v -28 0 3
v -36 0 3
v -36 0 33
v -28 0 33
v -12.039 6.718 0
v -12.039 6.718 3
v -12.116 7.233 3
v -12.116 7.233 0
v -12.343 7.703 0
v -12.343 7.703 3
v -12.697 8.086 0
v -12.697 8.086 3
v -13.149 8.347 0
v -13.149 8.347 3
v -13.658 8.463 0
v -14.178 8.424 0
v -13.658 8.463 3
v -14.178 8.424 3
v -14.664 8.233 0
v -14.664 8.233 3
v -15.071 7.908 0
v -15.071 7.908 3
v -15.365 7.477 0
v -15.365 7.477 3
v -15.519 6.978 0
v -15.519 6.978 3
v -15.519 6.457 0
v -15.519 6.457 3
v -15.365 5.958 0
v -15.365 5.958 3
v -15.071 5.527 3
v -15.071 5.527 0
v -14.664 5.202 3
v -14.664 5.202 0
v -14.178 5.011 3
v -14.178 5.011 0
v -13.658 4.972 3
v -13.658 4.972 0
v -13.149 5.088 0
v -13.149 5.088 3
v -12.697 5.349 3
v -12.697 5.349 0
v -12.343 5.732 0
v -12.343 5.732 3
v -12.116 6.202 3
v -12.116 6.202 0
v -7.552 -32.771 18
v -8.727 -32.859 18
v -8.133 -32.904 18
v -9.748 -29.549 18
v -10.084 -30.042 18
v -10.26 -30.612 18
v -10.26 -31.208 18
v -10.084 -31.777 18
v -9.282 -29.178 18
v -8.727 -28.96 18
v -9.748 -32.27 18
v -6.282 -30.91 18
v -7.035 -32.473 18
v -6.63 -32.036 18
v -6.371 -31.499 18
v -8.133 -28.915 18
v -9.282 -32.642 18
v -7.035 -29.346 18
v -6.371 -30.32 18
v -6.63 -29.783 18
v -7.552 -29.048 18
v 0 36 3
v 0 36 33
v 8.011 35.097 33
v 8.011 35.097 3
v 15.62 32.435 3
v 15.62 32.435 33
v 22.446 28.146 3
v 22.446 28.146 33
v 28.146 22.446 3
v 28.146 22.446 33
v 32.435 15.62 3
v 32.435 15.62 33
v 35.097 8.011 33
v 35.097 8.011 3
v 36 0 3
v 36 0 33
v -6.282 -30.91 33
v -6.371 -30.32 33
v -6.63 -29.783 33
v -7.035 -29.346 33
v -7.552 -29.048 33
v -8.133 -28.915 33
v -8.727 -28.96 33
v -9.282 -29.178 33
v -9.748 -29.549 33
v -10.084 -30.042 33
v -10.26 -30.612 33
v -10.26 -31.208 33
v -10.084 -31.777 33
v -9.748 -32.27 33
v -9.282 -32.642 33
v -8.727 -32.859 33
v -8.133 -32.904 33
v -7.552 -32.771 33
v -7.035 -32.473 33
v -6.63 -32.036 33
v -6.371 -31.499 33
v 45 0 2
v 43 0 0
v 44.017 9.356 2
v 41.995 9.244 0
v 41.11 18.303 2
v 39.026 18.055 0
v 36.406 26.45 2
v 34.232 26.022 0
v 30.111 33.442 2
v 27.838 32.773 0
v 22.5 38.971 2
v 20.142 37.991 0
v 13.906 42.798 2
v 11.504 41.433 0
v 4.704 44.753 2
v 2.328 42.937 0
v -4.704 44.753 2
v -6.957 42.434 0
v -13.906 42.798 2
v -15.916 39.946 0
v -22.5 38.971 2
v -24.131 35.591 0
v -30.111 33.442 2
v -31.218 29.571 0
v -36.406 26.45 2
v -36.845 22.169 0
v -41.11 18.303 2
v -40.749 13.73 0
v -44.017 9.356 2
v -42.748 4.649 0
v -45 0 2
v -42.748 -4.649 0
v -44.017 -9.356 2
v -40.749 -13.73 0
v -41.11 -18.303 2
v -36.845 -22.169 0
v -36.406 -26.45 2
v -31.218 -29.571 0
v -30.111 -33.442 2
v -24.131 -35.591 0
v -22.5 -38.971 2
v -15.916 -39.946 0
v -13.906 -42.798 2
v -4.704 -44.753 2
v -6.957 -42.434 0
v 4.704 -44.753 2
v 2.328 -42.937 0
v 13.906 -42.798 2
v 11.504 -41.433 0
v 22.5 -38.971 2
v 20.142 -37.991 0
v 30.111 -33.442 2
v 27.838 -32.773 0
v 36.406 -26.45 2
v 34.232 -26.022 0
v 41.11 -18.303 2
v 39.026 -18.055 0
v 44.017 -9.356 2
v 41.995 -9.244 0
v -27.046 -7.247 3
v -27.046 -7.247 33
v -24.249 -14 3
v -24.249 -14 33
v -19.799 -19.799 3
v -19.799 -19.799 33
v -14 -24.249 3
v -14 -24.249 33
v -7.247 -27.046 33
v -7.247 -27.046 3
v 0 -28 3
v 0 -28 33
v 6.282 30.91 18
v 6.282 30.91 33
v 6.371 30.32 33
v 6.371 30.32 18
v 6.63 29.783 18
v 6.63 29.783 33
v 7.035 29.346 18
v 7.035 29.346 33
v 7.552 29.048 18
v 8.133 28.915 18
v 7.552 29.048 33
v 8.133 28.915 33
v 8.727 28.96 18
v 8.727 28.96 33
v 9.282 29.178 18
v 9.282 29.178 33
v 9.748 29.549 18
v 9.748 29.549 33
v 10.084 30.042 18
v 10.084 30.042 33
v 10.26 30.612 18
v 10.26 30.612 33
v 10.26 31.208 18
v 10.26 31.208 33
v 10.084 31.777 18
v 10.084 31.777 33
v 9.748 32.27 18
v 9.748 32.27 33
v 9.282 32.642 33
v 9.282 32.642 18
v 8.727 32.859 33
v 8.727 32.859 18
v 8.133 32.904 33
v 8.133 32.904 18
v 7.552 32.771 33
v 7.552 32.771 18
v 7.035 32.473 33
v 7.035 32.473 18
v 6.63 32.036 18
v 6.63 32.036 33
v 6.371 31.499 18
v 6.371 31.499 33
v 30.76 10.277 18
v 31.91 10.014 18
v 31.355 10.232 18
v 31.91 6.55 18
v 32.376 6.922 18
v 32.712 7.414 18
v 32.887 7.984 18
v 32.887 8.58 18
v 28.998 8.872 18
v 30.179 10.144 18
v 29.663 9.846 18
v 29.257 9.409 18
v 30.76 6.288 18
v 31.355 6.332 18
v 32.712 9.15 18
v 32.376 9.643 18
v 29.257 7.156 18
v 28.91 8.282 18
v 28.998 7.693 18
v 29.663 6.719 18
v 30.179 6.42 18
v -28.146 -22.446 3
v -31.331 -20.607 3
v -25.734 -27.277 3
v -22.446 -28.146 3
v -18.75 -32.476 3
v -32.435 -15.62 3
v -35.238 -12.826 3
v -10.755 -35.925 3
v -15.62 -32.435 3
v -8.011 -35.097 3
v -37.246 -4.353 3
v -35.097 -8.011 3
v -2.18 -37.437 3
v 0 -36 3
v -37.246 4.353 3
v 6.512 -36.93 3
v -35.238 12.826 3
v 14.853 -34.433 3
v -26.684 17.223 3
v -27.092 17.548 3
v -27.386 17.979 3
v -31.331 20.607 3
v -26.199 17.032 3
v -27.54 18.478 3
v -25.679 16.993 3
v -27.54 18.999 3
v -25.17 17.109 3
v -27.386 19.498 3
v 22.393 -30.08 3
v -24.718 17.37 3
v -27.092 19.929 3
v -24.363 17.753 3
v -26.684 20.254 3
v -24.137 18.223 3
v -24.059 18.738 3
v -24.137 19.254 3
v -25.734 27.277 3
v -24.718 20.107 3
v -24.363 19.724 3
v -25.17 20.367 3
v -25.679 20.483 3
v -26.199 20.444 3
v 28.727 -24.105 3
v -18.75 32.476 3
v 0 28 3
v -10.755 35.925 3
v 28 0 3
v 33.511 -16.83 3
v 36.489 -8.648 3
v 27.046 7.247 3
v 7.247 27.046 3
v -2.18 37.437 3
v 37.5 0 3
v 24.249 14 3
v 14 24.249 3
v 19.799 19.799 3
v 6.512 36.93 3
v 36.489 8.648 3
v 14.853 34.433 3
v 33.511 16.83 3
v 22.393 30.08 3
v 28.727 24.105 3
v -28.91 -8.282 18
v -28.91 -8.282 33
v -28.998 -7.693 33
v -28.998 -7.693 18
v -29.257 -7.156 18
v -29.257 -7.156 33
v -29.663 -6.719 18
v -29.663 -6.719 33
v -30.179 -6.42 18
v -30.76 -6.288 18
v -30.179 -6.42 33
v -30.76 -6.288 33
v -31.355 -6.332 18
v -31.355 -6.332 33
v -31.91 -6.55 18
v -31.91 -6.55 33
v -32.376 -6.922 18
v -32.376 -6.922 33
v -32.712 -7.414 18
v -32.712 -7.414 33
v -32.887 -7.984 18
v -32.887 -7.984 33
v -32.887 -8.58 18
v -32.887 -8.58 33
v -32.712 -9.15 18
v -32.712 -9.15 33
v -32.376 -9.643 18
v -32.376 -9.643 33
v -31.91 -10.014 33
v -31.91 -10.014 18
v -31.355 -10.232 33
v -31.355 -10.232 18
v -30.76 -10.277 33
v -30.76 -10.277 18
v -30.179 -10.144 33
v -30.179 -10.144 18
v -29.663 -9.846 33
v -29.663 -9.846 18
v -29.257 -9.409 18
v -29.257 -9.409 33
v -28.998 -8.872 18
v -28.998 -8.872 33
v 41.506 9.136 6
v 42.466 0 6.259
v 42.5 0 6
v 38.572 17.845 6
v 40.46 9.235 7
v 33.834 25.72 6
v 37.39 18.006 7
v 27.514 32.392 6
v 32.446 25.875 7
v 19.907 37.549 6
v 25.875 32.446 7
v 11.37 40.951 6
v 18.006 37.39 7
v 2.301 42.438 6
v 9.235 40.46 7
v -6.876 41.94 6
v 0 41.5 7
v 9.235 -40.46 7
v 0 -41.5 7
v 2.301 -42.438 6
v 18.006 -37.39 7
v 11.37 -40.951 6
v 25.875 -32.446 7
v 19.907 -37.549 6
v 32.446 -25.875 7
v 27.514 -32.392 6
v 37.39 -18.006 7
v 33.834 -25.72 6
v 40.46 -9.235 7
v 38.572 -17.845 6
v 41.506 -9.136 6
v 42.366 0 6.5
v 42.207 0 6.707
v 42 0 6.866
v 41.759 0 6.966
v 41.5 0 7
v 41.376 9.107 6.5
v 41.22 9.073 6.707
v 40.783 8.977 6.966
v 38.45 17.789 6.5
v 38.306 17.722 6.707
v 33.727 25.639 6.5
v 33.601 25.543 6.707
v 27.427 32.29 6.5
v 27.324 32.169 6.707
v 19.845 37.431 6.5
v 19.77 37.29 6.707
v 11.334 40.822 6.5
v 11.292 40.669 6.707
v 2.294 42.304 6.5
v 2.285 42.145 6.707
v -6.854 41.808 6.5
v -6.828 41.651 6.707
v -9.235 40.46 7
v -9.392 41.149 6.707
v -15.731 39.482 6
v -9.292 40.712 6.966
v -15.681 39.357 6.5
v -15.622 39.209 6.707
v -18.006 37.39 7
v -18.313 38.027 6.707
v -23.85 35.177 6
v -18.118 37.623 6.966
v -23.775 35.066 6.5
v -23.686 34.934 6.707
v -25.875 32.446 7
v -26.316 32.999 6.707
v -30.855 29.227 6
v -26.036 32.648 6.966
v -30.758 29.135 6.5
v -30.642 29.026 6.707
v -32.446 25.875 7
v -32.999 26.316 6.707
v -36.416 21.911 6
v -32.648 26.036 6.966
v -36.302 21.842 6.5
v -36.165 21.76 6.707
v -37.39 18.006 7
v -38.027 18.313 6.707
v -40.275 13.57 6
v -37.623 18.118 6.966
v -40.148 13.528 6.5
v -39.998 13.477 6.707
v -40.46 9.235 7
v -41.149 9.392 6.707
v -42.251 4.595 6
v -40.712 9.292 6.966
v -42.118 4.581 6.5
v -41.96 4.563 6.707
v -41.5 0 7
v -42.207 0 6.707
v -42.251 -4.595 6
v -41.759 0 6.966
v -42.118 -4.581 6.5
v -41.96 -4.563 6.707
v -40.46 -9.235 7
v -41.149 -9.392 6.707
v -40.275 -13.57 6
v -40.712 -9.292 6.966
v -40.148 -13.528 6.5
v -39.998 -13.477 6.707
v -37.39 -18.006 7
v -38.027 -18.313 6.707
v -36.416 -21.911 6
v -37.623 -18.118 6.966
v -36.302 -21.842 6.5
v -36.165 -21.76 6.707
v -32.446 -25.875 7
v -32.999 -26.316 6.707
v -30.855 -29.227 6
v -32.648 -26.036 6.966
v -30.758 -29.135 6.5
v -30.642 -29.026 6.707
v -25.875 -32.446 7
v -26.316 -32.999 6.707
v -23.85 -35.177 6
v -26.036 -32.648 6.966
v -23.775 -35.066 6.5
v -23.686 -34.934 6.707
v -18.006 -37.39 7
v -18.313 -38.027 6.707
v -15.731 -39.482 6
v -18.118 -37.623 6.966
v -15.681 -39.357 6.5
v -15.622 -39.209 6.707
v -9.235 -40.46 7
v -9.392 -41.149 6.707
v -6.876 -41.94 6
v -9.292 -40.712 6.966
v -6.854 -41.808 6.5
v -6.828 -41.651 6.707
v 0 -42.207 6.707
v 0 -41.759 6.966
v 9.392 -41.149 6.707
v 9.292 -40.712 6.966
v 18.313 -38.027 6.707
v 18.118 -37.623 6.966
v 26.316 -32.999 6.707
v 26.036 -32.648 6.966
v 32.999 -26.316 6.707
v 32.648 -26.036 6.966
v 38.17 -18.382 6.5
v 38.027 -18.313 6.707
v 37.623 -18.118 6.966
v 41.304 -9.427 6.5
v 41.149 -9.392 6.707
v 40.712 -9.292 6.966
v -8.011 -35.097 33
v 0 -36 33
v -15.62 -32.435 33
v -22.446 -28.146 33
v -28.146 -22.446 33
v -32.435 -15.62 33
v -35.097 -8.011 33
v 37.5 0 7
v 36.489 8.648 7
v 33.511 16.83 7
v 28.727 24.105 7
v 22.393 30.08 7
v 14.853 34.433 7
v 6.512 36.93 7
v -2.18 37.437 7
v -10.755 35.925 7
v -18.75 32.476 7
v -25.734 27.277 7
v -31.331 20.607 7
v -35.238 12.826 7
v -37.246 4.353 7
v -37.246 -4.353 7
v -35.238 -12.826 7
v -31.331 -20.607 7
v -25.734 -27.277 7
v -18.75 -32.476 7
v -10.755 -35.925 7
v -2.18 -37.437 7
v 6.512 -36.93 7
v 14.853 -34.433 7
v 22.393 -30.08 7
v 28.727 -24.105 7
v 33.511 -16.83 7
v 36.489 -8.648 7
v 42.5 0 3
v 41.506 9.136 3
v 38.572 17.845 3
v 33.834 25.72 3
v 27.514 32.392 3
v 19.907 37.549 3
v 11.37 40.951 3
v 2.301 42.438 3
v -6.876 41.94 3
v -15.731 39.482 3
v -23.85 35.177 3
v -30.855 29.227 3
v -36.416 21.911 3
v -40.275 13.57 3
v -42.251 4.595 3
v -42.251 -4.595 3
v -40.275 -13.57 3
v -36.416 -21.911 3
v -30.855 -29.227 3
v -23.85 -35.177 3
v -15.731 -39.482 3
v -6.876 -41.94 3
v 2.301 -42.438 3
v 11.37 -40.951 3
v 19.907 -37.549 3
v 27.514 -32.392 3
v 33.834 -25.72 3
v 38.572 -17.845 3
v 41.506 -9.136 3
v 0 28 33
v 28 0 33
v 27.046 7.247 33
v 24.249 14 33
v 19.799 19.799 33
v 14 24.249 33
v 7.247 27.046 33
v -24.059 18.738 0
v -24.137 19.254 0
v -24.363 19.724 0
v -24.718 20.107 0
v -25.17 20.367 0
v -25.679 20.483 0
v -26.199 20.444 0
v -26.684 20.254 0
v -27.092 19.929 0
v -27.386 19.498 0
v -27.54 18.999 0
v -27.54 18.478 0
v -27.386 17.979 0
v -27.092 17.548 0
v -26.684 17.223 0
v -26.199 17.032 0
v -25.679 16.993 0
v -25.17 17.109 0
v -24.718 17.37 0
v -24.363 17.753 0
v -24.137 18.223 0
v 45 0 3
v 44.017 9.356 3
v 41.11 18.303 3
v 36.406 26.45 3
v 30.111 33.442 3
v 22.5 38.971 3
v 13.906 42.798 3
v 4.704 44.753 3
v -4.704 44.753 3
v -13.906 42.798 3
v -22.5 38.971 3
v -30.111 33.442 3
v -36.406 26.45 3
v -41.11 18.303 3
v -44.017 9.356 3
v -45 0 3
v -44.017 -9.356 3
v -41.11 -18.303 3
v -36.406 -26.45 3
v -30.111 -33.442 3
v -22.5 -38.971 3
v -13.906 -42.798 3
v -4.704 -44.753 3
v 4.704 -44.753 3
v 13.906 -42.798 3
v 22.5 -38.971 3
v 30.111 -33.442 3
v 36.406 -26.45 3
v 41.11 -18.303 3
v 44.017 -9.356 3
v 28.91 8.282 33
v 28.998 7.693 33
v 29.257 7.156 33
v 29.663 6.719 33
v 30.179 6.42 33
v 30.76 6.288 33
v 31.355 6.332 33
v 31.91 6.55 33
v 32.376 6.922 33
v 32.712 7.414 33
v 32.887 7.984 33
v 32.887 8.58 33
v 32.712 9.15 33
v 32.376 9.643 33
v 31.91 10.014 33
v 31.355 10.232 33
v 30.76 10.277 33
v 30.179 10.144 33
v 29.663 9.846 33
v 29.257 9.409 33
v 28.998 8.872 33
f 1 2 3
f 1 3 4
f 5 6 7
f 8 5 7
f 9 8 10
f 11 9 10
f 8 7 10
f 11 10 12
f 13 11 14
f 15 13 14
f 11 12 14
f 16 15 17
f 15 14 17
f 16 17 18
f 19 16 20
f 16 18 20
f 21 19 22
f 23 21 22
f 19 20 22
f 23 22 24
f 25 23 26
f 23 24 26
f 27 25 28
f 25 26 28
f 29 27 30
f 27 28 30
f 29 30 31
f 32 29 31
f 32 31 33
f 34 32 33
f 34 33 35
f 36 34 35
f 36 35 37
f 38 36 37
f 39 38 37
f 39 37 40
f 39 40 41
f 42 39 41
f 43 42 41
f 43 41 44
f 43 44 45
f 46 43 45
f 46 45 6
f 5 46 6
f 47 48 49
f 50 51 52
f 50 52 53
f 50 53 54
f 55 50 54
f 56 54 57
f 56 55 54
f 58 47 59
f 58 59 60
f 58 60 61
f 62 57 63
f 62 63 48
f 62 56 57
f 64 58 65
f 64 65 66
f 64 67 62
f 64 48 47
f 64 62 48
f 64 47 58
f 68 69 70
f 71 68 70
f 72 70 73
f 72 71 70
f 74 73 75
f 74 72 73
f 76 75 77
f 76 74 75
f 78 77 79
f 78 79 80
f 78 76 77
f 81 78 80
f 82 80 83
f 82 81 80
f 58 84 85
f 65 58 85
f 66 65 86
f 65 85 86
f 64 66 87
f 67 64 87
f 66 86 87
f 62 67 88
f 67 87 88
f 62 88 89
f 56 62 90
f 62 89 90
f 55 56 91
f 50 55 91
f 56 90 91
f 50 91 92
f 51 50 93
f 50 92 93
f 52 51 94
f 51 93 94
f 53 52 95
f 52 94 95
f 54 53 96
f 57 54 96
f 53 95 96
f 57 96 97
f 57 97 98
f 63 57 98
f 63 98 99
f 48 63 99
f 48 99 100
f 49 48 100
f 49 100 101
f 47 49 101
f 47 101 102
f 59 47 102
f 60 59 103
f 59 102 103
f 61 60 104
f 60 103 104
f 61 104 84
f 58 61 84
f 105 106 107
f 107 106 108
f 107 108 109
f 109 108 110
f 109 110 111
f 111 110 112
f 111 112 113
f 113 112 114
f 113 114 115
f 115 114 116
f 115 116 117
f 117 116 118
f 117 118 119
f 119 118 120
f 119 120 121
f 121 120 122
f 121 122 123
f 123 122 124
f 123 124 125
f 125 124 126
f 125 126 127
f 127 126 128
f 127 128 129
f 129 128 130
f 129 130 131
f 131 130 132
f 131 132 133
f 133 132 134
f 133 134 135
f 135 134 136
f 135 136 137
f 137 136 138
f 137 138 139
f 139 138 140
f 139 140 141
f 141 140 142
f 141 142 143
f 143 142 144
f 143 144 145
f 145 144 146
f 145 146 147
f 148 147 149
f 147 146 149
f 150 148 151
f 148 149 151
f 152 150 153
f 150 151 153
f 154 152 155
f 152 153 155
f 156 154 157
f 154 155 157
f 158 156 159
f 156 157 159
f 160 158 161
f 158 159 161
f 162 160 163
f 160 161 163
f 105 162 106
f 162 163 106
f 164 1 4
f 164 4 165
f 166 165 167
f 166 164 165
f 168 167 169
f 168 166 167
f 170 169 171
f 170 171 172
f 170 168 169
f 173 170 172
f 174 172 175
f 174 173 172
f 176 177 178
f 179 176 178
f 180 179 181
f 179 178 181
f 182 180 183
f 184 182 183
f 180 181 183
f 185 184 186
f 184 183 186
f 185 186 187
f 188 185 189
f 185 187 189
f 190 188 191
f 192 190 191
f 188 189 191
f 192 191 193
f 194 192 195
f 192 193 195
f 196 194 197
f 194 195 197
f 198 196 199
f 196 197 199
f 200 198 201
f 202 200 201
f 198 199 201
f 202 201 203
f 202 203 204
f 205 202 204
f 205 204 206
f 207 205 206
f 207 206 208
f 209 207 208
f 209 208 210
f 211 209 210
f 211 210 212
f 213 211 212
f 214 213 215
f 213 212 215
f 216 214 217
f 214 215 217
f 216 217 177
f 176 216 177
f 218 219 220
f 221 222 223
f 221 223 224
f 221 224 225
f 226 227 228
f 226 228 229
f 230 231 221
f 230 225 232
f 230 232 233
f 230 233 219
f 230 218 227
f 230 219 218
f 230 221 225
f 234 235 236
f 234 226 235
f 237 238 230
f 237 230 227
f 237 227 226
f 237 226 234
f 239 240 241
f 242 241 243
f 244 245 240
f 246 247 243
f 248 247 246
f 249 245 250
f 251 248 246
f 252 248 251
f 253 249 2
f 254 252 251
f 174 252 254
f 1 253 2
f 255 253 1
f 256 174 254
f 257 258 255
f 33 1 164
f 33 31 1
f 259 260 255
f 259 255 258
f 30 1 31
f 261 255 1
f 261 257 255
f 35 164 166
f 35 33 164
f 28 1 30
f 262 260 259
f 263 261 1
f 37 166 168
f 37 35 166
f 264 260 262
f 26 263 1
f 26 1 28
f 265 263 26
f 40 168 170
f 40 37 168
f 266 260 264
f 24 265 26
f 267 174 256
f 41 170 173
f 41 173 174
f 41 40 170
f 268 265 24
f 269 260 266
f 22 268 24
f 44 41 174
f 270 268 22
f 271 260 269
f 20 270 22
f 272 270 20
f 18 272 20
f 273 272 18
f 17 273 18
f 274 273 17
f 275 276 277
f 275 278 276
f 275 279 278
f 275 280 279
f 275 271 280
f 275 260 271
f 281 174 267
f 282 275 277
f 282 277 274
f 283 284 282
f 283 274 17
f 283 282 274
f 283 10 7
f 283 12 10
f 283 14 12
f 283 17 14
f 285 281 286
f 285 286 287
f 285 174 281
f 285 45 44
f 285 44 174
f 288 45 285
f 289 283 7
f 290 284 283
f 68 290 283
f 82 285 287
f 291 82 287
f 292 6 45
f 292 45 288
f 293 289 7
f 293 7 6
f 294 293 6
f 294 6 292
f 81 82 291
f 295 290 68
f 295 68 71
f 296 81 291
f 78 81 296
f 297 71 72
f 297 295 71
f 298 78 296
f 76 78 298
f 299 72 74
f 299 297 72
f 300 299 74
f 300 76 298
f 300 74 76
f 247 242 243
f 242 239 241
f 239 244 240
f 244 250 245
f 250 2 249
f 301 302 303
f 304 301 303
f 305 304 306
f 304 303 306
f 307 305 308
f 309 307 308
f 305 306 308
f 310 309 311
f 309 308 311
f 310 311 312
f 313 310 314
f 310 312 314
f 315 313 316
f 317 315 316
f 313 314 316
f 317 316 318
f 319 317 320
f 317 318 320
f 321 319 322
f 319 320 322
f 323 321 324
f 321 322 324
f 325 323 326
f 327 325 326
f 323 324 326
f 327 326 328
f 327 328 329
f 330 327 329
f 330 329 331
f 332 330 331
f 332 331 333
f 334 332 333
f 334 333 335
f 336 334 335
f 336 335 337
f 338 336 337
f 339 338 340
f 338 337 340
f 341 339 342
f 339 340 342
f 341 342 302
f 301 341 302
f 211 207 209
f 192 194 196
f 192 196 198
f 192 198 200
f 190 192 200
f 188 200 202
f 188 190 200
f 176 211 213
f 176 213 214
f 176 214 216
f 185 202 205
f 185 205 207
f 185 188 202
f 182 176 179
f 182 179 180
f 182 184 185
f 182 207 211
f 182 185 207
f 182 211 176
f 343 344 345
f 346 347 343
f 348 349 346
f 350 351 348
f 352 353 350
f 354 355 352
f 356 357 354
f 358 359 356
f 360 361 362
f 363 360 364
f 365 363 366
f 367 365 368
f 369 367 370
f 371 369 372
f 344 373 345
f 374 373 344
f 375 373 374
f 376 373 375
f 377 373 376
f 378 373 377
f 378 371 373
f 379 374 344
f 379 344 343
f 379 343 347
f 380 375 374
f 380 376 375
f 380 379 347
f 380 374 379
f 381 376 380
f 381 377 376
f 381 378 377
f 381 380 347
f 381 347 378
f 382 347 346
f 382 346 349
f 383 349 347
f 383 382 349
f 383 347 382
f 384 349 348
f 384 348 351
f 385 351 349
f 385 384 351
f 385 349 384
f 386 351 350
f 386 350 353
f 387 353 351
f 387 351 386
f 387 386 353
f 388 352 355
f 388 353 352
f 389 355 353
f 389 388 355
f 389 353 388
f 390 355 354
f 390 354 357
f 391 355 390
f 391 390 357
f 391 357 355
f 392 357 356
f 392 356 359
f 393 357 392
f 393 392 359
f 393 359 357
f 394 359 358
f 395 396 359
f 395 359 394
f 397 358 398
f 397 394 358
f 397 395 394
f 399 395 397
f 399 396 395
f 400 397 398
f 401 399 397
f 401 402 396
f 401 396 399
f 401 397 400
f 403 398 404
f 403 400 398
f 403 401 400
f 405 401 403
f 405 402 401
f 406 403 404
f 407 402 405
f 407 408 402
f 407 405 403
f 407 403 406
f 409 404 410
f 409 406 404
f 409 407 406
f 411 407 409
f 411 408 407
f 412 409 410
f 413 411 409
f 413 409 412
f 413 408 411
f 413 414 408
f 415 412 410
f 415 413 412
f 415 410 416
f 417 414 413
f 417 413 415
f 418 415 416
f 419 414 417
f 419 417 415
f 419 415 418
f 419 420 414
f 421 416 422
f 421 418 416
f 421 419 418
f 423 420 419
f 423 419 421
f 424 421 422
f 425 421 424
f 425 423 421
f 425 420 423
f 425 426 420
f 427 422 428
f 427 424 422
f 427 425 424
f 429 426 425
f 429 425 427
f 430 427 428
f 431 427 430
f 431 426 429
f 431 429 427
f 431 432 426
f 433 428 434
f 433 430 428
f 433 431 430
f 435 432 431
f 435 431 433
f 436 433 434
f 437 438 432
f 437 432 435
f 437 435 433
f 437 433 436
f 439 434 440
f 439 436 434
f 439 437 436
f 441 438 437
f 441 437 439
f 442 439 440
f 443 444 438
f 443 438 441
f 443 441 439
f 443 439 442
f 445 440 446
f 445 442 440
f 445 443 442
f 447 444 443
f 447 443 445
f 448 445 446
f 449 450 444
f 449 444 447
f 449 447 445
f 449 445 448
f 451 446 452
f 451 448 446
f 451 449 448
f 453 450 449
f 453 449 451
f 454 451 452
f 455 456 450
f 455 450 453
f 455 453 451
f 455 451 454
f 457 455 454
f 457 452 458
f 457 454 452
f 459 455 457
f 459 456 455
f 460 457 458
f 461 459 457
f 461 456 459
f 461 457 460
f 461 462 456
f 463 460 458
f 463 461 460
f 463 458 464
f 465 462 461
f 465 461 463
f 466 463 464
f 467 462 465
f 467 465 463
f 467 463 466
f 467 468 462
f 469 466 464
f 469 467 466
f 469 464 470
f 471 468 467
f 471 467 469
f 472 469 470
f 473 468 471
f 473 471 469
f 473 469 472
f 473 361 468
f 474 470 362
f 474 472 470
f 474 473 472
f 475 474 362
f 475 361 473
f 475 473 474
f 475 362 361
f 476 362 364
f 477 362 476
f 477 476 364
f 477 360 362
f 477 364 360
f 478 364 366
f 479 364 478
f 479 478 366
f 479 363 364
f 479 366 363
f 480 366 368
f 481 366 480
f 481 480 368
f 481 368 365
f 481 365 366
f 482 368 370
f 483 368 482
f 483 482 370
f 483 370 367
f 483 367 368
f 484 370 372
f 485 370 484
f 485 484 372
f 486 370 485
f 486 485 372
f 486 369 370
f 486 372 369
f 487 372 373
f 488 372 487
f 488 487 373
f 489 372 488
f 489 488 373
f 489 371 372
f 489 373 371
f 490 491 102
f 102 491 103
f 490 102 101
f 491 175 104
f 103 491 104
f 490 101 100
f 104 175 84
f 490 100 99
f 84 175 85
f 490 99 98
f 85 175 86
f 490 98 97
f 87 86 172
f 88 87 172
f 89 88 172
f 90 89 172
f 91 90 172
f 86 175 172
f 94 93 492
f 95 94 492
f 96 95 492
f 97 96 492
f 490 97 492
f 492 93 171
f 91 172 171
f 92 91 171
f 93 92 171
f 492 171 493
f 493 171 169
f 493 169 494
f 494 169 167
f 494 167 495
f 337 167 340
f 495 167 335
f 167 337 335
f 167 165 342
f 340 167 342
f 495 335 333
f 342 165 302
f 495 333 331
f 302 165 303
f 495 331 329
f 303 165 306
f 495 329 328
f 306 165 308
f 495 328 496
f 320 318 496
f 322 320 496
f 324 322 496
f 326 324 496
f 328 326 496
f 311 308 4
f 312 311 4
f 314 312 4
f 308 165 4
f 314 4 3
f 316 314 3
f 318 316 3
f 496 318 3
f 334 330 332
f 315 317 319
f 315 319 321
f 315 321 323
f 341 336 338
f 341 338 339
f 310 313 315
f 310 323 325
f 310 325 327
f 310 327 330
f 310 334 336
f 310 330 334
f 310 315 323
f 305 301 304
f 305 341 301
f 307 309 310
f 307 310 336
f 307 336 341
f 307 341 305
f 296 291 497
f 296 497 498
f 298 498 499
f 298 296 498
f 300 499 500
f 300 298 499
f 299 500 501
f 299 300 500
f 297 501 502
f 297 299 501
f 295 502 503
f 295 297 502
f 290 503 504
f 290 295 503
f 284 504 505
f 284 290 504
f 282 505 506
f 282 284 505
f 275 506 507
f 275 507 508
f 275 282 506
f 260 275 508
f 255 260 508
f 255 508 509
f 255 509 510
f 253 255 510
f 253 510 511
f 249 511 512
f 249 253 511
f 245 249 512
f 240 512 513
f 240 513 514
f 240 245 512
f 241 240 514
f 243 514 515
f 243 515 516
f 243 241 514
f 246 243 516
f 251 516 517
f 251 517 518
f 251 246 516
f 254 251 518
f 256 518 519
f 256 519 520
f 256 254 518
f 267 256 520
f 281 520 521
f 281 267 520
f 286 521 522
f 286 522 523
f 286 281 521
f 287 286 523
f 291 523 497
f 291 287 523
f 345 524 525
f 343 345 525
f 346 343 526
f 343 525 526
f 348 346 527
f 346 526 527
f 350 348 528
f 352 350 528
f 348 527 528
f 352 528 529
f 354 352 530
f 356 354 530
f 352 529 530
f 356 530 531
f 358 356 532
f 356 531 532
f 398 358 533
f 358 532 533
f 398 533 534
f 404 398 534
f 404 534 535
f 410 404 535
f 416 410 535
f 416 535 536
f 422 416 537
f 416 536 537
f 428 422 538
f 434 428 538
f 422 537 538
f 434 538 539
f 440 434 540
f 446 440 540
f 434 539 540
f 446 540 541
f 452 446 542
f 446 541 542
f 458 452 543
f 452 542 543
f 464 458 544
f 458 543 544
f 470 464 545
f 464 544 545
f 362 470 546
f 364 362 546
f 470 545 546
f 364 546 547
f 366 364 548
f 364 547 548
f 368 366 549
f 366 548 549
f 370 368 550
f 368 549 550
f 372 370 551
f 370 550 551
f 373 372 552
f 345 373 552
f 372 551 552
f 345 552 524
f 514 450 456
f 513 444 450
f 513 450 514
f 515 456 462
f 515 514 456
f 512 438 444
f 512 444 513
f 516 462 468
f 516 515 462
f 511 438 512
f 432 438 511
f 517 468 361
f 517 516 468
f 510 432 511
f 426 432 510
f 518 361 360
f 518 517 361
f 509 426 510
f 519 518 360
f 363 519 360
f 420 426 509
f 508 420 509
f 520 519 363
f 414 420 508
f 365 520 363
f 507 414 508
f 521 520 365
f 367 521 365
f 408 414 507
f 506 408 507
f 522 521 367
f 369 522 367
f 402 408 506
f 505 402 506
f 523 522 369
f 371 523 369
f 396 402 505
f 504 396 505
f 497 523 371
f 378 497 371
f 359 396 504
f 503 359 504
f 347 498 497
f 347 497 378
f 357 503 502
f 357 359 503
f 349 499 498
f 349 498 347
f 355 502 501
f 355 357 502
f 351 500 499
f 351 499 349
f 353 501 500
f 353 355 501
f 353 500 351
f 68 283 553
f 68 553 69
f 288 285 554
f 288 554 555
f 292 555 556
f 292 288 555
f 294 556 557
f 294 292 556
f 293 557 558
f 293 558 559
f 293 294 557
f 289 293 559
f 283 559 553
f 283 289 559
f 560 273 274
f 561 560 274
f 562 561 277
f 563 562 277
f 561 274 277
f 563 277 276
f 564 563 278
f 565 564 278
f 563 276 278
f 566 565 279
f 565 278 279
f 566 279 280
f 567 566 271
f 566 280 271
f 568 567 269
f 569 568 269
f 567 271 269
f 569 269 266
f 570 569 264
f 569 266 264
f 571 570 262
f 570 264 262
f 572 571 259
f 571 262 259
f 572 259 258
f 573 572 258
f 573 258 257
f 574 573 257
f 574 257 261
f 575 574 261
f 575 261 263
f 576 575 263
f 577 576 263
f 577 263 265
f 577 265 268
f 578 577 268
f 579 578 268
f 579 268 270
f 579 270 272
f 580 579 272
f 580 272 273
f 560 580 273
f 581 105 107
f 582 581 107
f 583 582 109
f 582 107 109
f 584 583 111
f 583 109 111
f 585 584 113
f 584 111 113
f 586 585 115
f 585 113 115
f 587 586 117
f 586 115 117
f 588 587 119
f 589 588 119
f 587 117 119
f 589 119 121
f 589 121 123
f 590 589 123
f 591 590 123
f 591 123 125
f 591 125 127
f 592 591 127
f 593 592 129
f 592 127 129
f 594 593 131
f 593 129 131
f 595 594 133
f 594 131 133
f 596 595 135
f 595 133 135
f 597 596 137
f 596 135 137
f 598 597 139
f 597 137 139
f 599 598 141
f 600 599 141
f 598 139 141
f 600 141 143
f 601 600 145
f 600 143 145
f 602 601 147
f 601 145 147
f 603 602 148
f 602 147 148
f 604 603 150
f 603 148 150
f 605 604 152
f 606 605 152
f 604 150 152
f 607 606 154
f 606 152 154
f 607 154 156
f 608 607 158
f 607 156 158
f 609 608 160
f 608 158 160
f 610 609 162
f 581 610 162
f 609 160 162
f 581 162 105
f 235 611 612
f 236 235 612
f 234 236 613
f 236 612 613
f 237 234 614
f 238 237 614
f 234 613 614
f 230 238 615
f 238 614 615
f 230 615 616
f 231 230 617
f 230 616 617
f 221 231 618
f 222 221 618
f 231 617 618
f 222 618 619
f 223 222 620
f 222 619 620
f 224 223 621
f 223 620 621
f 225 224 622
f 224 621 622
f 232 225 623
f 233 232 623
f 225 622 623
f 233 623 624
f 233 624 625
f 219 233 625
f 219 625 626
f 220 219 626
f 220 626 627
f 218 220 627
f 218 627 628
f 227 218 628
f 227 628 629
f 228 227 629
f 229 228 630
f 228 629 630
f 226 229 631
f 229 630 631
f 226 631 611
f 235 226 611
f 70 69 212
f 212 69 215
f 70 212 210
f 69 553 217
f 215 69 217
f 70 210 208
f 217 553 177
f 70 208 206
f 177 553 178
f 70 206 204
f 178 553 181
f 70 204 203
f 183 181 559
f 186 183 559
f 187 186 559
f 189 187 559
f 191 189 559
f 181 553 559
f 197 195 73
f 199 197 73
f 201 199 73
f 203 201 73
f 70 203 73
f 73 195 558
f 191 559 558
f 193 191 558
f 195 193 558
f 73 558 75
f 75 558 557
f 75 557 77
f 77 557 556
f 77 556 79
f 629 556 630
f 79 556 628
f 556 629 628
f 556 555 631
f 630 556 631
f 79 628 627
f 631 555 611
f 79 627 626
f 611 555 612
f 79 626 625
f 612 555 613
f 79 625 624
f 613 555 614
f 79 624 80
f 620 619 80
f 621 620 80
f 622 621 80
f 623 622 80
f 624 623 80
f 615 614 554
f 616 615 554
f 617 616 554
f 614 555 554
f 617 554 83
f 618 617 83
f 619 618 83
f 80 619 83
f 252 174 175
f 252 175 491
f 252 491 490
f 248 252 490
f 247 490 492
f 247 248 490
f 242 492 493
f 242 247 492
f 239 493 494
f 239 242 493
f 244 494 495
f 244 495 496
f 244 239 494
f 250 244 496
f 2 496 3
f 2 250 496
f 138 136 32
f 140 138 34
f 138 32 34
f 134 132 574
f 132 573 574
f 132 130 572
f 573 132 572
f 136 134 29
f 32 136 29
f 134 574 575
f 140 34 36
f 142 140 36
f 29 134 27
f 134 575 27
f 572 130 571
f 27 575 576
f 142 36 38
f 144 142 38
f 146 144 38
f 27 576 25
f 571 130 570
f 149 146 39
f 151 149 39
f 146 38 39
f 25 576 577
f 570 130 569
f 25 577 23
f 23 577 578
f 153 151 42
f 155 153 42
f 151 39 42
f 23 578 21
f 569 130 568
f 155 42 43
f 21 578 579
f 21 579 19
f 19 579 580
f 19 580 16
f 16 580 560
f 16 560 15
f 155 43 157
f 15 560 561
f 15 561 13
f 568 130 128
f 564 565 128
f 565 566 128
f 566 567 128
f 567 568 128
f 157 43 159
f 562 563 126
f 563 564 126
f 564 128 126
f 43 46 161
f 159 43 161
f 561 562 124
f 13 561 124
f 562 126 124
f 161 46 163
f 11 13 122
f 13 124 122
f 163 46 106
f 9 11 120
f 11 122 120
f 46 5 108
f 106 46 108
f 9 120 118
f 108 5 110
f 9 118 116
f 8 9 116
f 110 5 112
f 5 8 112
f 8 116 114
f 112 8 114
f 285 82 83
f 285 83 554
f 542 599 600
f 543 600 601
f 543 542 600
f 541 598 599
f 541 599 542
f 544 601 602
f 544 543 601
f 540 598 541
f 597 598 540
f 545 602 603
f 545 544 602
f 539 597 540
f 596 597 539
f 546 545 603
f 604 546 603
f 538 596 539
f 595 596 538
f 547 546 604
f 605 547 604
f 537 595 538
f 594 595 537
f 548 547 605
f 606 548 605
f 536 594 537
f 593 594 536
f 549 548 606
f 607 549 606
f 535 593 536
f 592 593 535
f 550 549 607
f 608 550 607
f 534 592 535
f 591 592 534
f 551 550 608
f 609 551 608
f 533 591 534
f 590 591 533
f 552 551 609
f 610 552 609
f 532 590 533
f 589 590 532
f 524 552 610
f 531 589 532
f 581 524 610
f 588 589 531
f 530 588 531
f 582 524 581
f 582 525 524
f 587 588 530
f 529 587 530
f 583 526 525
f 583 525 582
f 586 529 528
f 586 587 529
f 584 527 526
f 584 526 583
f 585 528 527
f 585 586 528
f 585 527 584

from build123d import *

# Parameters (mm, degrees)
SKETCH1_R           = 45
BOSS_EXTRUDE1_DEPTH = 3
SKETCH2_R           = 42.5
SKETCH2_R_2         = 37.5
BOSS_EXTRUDE2_DEPTH = 4
CHAMFER1_SIZE       = 2
FILLET1_R           = 1
BOSS_EXTRUDE3_DEPTH = 30
SKETCH4_R           = 2
CUT_EXTRUDE1_DEPTH  = 15
CIRPATTERN1_COUNT   = 2
SKETCH5_R           = 1.75
CUT_EXTRUDE2_DEPTH  = 4


with BuildPart() as part:
    # Sketch1 → Boss-Extrude1 (new body)
    with BuildSketch(Plane.XY):
        Circle(SKETCH1_R)
    extrude(amount=BOSS_EXTRUDE1_DEPTH)

    # Sketch2 → Boss-Extrude2 (add)
    with BuildSketch(Plane.XY.offset(3)):
        Circle(SKETCH2_R)
        Circle(SKETCH2_R_2, mode=Mode.SUBTRACT)
    extrude(amount=BOSS_EXTRUDE2_DEPTH)

    # Chamfer1
    chamfer1_edges = [part.edges().sort_by_distance(p)[0] for p in [
        (-45, 0, 0),
    ]]
    chamfer(chamfer1_edges, length=CHAMFER1_SIZE)

    # Fillet1
    fillet1_edges = [part.edges().sort_by_distance(p)[0] for p in [
        (-42.5, 0, 7),
    ]]
    fillet(fillet1_edges, radius=FILLET1_R)

    # Sketch3 → Boss-Extrude3 (add)
    with BuildSketch(Plane.XY.offset(3)):
        with BuildLine():
            Line((-36, 0), (-28, 0))
            ThreePointArc((-28, 0), (-19.798989873, -19.798989873), (0, -28))
            Line((0, -28), (0, -36))
            ThreePointArc((0, -36), (-25.455844123, -25.455844123), (-36, 0))
        make_face()
    boss_extrude3 = extrude(amount=BOSS_EXTRUDE3_DEPTH)

    # Sketch4 → Cut-Extrude1 (cut)
    with BuildSketch(Plane.XY.offset(33)):
        with Locations((-30.909626441, -8.282209443)):
            Circle(SKETCH4_R)
        with Locations((-8.282209443, -30.909626441)):
            Circle(SKETCH4_R)
    cut_extrude1 = extrude(amount=-CUT_EXTRUDE1_DEPTH, mode=Mode.SUBTRACT)

    # CirPattern1: Boss-Extrude3, Cut-Extrude1 ×2 about axis
    cirpattern1_axis = Axis((0, 0, 0), (0, 0, 1))
    for i in range(1, CIRPATTERN1_COUNT):
        add(boss_extrude3.rotate(cirpattern1_axis, i * 360 / CIRPATTERN1_COUNT))
        add(cut_extrude1.rotate(cirpattern1_axis, i * 360 / CIRPATTERN1_COUNT), mode=Mode.SUBTRACT)

    # Sketch5 → Cut-Extrude2 (cut, through all)
    with BuildSketch(Plane.XY.offset(3)):
        with Locations((-25.809397513, 18.738329701)):
            Circle(SKETCH5_R)
        with Locations((-13.788582233, 6.717514421)):
            Circle(SKETCH5_R)
    extrude(amount=-CUT_EXTRUDE2_DEPTH, mode=Mode.SUBTRACT)


solid = part.part
